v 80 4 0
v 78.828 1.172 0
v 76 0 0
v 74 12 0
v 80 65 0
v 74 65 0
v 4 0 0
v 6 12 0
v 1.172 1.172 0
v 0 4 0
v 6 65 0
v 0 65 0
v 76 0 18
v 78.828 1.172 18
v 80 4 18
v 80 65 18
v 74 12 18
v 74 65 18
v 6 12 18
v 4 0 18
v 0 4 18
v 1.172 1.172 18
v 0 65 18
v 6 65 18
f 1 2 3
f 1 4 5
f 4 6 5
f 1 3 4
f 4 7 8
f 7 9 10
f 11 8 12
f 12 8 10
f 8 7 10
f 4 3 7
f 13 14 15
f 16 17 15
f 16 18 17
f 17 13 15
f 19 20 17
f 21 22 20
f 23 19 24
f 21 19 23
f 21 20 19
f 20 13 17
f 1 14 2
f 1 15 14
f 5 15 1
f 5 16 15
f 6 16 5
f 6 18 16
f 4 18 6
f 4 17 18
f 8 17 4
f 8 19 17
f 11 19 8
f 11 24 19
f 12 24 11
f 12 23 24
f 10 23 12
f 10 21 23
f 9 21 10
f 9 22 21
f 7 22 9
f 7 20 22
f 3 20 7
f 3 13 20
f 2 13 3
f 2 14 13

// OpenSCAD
$fn = 32;

// ----------------------------------------------------------------------
// Heat sink frame: 80 x 65 mm frame, 6 mm walls
// ----------------------------------------------------------------------

// --- parameters (mm) ---
profile_height = 18;      // extrusion height
profile_points = 12;      // points of the closed outline

profile = [[0, 4], [1.172, 1.172], [4, 0], [76, 0], [78.828, 1.172], [80, 4], [80, 65], [74, 65], [74, 12], [6, 12], [6, 65], [0, 65]];  // single closed polygon, 12 points, counter clockwise

// --- the one profile operation ---
linear_extrude(height = profile_height) polygon(points = profile);
